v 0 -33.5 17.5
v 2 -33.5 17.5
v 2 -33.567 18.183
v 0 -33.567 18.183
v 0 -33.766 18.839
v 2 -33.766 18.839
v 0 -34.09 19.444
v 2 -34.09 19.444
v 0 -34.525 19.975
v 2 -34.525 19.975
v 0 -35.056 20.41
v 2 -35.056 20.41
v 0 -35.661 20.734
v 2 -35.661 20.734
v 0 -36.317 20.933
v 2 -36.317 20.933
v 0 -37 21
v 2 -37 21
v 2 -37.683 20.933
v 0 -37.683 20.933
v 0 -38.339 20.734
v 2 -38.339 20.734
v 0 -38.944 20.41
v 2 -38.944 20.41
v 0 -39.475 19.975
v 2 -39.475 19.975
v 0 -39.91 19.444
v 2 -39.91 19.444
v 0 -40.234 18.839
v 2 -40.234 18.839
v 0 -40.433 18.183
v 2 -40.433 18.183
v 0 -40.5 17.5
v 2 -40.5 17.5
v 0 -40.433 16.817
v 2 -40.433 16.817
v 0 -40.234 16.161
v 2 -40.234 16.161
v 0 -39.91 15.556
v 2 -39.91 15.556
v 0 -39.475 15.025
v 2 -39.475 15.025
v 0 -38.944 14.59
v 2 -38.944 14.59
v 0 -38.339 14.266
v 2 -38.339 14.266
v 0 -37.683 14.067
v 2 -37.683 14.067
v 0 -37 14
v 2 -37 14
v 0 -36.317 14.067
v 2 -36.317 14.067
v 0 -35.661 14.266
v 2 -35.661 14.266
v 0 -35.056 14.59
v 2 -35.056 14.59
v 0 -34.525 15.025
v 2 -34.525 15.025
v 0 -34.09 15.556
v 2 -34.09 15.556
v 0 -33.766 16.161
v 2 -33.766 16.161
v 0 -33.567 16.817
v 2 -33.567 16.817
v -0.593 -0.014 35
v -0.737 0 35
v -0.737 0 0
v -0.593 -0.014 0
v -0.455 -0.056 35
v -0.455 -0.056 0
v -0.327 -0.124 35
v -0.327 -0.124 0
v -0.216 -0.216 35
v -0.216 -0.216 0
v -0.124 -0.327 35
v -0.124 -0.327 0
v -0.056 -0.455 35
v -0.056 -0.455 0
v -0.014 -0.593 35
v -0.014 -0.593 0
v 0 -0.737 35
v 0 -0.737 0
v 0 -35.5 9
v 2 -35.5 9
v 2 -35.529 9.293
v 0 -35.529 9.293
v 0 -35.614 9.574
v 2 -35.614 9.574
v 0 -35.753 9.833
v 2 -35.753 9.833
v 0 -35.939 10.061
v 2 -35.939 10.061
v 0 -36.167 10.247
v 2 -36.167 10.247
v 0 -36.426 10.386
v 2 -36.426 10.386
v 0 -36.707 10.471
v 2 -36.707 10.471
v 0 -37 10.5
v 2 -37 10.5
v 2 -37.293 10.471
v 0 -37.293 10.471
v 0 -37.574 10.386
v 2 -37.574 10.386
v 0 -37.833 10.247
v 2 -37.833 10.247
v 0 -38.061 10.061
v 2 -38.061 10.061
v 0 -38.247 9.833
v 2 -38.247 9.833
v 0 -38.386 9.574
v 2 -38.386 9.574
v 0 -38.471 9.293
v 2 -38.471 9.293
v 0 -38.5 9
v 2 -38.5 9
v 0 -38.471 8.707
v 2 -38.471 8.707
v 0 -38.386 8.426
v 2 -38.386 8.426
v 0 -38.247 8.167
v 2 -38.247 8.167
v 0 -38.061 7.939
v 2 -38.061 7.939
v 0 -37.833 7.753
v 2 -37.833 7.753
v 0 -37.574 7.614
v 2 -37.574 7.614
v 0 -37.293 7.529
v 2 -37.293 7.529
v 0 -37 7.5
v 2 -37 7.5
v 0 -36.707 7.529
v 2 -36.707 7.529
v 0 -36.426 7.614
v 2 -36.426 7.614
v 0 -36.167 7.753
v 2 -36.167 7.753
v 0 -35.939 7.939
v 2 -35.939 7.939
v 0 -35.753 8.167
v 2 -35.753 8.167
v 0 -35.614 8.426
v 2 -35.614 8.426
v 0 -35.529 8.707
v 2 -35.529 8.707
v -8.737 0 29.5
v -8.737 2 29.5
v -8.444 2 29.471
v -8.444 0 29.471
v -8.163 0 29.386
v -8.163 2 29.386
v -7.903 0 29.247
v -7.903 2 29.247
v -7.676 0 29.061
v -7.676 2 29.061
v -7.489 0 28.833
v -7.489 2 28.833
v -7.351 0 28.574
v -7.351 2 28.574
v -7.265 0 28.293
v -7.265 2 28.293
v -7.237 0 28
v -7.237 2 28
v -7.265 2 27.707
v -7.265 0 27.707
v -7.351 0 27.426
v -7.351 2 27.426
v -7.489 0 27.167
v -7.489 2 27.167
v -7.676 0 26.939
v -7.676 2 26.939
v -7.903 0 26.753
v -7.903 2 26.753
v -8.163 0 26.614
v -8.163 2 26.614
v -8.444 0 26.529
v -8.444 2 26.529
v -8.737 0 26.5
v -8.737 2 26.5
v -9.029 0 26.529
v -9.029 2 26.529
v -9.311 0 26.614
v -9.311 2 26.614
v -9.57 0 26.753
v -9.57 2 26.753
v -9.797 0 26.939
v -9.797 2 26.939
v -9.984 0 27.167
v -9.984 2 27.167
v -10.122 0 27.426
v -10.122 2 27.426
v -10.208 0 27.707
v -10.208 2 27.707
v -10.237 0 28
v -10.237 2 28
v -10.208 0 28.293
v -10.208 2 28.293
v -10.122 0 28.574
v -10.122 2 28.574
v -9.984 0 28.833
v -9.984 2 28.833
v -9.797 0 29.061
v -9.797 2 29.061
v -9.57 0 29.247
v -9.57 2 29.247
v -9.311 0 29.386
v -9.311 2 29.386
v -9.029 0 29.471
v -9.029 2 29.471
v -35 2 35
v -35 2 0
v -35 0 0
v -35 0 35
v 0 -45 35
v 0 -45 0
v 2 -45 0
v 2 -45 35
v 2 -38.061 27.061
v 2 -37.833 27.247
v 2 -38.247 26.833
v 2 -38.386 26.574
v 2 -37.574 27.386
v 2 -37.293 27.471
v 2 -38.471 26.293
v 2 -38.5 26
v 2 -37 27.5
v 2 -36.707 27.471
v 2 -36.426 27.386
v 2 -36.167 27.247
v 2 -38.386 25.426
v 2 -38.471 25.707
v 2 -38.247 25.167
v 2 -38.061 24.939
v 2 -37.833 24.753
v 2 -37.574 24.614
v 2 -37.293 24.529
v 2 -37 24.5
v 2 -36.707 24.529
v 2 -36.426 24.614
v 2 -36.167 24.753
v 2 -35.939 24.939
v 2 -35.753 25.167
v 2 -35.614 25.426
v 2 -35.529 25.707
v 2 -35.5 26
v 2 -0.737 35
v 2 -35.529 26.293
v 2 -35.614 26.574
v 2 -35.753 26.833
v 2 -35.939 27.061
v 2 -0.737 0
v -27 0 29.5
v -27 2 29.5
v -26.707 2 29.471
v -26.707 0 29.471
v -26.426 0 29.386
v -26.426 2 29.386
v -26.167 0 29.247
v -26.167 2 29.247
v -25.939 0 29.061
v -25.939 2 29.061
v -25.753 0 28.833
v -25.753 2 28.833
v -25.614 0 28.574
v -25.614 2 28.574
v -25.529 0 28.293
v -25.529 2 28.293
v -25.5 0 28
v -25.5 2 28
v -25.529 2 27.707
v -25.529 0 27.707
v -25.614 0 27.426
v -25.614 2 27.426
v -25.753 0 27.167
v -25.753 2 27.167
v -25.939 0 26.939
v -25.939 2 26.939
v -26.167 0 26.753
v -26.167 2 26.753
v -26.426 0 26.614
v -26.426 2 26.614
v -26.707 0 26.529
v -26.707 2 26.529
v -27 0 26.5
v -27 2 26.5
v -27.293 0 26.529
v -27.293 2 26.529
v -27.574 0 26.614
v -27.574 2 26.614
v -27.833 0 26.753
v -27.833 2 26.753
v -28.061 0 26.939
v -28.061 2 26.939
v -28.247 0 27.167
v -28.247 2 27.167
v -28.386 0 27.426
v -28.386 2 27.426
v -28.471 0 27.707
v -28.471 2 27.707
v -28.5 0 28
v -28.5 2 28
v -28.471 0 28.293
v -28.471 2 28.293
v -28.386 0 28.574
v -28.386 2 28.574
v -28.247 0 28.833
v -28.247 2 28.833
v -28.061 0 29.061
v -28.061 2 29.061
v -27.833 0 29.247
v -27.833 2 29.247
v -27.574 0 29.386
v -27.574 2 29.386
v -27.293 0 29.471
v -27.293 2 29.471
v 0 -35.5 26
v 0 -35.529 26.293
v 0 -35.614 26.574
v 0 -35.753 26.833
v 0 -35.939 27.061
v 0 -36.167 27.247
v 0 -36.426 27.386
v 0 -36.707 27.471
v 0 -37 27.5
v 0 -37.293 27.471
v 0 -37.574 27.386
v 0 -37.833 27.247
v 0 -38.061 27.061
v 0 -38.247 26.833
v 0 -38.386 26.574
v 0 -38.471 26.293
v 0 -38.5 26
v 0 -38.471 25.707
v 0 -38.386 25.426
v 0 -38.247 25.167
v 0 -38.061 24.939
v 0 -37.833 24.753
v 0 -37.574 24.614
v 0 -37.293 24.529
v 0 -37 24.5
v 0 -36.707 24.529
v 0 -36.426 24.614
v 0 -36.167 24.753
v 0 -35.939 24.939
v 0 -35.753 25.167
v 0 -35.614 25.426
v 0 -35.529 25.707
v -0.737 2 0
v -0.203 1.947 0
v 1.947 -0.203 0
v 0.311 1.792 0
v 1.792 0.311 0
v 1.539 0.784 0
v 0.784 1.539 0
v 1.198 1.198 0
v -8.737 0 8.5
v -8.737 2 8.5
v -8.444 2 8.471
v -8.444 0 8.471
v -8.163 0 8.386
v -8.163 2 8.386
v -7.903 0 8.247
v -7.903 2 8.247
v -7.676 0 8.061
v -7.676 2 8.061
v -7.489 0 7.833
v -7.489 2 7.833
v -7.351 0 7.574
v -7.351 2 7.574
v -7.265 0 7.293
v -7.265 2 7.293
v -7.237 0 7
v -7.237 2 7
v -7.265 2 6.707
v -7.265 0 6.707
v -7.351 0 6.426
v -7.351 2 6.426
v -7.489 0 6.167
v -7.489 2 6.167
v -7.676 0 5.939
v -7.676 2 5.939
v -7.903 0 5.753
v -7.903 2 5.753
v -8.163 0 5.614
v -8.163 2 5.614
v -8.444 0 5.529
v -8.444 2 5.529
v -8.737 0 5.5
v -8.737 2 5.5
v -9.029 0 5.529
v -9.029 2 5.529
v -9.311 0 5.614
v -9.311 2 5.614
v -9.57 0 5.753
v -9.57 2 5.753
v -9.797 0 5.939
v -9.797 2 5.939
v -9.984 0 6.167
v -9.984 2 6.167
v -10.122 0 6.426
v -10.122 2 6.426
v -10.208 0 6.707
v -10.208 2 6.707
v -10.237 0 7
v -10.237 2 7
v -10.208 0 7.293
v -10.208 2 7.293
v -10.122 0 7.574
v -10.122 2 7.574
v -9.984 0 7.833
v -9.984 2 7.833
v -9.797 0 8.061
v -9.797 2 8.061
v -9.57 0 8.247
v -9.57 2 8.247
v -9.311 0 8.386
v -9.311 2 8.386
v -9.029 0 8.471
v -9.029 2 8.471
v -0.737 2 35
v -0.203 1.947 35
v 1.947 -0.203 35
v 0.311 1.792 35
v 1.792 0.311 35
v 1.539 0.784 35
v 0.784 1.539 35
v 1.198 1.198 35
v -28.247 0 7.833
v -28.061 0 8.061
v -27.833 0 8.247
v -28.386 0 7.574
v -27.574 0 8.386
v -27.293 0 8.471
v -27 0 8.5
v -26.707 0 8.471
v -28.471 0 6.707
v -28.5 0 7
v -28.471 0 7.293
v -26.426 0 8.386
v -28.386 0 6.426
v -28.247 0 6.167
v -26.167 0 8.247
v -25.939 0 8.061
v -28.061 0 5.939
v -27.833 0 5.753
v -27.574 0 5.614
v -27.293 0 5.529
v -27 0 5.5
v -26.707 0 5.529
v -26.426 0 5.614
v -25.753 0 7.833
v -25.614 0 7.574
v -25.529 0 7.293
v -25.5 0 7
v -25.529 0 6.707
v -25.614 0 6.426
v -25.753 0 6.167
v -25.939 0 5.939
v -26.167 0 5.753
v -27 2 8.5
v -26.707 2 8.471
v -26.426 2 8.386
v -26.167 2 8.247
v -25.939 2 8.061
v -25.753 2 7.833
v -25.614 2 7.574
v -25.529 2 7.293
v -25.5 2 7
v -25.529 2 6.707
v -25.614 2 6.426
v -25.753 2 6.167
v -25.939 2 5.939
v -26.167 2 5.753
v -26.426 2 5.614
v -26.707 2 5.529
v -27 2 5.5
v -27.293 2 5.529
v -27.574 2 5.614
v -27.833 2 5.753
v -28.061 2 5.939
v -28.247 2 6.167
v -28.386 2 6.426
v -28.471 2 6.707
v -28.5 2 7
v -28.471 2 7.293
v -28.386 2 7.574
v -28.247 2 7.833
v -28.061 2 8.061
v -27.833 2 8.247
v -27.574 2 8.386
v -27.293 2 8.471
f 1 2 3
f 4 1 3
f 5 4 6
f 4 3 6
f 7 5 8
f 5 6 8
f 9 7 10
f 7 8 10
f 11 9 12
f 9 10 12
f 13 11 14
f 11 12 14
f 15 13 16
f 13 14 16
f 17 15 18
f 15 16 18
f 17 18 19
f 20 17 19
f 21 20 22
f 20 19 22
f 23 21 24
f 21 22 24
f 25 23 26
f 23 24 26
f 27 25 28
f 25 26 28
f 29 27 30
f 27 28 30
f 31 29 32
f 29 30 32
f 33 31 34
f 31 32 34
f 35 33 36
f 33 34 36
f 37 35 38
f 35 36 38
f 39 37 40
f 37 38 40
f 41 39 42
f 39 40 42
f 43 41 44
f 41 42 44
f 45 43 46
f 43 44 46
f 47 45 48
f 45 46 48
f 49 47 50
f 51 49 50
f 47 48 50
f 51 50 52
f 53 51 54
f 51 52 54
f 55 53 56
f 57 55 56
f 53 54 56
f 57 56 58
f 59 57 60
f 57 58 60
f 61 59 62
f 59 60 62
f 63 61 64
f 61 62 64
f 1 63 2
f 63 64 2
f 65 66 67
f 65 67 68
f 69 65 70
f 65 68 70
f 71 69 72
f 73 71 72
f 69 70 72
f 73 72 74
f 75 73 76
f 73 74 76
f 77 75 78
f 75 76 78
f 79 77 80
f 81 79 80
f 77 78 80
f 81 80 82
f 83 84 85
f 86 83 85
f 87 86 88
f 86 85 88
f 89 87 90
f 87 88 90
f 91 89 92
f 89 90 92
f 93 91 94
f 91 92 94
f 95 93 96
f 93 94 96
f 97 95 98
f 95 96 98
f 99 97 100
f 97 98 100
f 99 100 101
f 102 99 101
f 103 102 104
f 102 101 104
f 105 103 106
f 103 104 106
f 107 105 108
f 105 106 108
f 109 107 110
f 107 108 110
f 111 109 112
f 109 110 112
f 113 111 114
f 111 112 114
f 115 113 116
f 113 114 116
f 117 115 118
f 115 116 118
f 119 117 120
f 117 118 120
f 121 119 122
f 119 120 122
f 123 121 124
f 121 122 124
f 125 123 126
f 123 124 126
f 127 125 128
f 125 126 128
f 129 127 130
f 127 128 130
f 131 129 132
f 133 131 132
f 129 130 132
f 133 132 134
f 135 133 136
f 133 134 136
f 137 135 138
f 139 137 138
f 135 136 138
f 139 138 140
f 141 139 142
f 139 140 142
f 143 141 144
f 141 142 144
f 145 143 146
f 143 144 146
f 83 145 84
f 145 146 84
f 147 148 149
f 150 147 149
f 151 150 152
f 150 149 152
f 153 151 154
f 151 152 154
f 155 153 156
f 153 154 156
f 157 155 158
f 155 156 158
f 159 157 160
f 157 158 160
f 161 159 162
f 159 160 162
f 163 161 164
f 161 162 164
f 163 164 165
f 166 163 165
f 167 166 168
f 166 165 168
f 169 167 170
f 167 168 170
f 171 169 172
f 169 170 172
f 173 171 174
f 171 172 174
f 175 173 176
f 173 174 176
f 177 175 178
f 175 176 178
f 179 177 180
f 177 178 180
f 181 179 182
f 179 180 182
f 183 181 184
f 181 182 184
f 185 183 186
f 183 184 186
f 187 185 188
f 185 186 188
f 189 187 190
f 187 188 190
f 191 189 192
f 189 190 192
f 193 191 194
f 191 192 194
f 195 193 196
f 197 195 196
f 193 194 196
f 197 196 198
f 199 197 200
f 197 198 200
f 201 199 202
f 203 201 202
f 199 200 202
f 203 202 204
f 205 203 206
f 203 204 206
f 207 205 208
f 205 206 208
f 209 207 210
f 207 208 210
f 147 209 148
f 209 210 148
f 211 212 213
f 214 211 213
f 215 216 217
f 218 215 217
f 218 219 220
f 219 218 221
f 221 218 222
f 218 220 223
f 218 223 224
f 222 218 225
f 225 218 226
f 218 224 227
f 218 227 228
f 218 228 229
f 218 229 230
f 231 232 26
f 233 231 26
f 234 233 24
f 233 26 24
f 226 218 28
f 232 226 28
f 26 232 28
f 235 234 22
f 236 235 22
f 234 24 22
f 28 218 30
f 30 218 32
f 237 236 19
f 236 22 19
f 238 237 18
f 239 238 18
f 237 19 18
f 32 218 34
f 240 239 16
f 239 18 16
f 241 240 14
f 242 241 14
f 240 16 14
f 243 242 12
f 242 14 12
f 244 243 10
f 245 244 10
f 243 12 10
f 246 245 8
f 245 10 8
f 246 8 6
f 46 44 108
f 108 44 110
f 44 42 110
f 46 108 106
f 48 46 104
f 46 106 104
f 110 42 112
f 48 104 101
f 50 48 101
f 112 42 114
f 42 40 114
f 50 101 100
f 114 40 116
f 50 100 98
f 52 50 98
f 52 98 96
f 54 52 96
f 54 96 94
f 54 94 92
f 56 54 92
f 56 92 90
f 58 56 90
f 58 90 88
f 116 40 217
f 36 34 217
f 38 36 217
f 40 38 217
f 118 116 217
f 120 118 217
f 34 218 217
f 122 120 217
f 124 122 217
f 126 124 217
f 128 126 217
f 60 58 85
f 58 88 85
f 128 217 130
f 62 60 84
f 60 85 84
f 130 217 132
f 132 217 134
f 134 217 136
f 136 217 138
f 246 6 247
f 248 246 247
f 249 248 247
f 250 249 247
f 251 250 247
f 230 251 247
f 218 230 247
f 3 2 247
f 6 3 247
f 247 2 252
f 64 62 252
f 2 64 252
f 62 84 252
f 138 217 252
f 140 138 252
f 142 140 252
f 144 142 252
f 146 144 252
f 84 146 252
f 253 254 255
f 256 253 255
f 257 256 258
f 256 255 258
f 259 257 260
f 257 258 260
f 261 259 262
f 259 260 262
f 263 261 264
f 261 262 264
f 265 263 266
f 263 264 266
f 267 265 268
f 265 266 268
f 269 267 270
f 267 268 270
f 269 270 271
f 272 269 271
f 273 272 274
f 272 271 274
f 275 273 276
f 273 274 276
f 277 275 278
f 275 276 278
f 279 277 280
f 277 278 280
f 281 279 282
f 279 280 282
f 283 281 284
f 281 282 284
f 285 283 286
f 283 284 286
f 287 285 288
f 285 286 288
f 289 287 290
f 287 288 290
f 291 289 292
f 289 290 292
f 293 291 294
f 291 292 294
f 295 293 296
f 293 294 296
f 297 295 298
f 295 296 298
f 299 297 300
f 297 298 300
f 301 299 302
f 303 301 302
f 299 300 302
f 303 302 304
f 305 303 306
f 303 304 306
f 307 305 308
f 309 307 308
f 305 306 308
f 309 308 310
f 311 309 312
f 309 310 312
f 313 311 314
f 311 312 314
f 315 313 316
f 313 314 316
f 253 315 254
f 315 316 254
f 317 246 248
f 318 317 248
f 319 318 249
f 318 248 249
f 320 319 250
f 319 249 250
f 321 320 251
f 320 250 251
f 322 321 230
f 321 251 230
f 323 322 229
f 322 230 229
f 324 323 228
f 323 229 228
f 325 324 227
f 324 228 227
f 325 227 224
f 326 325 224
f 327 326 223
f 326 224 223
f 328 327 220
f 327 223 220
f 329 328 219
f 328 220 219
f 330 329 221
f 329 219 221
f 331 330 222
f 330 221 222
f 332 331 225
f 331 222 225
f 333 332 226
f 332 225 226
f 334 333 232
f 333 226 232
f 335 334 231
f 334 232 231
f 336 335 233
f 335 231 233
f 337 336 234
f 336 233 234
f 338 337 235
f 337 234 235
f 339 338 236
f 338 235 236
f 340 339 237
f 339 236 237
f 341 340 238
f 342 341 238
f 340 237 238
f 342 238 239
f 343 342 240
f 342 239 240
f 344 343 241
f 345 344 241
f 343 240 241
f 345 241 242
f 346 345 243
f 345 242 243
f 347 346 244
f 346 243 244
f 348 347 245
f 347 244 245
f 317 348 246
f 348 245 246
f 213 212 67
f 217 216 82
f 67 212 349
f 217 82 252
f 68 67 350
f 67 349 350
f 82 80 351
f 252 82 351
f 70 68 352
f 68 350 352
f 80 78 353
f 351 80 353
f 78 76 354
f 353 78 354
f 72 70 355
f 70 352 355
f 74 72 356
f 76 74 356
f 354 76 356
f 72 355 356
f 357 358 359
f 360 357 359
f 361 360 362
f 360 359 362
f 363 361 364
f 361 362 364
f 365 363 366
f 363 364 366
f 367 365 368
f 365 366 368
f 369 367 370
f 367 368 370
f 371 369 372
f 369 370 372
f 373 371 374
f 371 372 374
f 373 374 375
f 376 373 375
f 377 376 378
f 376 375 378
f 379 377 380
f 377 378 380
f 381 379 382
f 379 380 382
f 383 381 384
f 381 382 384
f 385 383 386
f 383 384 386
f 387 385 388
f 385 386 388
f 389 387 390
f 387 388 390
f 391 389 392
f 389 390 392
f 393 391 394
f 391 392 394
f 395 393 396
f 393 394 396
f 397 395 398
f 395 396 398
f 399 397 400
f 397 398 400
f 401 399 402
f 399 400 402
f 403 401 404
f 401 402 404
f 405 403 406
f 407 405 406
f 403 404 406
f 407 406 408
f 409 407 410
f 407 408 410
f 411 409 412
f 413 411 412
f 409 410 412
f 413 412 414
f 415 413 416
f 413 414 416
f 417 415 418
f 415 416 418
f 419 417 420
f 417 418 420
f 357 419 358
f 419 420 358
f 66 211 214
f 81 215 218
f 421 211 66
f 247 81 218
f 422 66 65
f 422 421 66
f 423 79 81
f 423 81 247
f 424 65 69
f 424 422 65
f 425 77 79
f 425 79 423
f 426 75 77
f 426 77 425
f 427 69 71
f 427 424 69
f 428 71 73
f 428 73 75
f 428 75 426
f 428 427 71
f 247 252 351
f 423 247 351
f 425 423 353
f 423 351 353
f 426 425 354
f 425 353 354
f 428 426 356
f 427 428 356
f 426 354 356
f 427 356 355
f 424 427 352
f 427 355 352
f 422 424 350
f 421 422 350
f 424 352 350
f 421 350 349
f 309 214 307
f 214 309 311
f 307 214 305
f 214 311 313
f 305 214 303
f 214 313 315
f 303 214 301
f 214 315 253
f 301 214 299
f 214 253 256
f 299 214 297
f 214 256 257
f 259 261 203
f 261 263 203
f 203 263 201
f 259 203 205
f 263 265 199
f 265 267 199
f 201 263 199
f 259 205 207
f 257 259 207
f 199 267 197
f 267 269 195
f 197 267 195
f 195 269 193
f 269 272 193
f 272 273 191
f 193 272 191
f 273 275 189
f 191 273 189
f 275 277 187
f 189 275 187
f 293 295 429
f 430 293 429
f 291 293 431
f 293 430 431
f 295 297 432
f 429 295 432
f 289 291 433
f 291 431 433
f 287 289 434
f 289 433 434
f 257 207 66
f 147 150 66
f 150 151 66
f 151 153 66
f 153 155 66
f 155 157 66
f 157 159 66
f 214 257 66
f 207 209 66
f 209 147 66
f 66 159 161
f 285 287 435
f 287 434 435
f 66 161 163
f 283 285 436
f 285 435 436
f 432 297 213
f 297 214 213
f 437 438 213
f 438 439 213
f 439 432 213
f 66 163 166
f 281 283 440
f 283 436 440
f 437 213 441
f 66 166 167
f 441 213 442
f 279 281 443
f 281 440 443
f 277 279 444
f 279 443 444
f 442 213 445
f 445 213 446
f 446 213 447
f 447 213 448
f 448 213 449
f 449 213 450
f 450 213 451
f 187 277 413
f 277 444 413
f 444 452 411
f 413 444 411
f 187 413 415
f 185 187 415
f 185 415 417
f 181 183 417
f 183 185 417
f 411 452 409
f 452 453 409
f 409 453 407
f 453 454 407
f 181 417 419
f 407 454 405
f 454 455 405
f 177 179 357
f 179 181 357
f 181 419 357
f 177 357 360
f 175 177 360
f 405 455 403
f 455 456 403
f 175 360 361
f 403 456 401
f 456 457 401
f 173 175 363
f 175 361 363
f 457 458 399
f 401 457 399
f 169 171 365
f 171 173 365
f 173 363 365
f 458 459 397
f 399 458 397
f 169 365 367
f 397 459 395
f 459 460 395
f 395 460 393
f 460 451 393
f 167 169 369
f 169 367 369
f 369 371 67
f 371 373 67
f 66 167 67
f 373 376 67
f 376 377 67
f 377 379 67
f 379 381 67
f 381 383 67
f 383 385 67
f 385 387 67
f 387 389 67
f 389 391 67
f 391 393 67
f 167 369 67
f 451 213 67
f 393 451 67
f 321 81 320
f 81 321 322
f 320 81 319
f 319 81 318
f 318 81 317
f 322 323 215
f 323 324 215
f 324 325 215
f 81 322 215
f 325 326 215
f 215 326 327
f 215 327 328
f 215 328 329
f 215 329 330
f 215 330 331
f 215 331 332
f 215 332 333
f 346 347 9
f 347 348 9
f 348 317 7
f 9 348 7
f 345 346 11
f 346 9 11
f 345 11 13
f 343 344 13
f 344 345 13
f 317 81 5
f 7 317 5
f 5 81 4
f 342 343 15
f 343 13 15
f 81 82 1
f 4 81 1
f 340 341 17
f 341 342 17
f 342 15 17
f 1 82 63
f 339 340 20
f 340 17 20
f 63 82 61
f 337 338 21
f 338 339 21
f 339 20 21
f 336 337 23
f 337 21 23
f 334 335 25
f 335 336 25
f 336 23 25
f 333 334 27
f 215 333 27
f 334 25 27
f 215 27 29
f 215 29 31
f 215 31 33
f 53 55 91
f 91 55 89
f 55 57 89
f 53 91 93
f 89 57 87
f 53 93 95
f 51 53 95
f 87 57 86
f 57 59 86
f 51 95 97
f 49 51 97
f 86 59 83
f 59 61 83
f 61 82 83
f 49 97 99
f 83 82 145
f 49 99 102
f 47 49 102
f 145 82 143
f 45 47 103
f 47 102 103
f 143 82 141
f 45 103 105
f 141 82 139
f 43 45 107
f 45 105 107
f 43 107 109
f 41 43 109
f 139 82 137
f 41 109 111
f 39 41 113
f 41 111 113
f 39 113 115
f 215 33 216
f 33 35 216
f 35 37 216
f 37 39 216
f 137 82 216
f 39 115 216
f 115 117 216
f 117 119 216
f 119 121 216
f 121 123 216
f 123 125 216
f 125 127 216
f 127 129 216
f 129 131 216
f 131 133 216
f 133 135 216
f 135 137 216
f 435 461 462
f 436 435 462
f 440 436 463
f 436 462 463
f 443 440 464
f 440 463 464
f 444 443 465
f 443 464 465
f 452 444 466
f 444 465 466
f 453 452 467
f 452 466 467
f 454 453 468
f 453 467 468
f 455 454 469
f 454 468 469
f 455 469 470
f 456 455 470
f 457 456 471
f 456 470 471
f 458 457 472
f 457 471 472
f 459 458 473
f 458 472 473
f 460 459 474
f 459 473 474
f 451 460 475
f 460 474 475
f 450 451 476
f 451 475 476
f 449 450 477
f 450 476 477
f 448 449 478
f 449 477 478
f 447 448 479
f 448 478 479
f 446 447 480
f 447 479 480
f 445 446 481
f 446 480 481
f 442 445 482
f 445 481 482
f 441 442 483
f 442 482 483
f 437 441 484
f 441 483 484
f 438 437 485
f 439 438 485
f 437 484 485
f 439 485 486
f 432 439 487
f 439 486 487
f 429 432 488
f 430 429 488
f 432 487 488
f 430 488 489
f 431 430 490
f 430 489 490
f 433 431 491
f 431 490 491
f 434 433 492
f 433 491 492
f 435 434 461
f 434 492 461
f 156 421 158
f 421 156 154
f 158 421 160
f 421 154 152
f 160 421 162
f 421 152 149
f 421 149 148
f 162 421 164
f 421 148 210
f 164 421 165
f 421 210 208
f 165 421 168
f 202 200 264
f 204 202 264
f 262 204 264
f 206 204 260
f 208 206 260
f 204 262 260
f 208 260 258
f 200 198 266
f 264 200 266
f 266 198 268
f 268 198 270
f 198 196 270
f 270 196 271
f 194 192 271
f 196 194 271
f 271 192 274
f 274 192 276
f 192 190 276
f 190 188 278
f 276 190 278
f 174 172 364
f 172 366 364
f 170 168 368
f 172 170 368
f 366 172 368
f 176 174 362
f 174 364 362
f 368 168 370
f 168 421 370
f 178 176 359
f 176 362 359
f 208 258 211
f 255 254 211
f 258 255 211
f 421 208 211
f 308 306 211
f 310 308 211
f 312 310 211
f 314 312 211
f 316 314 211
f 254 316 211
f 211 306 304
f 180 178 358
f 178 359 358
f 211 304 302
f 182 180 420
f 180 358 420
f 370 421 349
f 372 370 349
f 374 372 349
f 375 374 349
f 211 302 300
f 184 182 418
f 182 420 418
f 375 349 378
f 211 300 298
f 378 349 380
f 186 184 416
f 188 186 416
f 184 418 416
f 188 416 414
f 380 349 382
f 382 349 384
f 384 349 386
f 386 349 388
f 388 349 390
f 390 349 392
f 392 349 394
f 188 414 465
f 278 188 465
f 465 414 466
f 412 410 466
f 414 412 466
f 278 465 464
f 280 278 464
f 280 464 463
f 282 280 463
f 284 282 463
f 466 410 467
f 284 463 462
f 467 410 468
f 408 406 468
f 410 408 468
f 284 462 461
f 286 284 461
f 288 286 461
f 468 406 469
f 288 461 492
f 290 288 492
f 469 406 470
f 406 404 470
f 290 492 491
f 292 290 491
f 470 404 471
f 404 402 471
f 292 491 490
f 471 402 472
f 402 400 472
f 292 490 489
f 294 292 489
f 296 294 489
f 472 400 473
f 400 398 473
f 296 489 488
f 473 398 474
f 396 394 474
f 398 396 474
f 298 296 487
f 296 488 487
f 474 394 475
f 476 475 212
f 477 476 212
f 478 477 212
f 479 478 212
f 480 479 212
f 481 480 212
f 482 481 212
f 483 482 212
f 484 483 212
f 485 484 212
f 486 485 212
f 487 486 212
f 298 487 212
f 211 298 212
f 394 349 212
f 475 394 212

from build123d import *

# Parameters (mm, degrees)
T_LE_DE_BASE_PLI_E1_DEPTH = 35
ESQUISSE14_R              = 1.5
ENL_V_MAT_EXTRU_1_DEPTH   = 2
ESQUISSE15_R              = 3.5
ESQUISSE15_R_2            = 1.5
ENL_V_MAT_EXTRU_2_DEPTH   = 2


# Sheet-metal steps are written as plain solids
with BuildPart() as part:
    # Esquisse8 → Tôle de base pliée1 (new body)
    with BuildSketch(Plane.XY):
        with BuildLine():
            Line((-35, 0), (-0.7366, 0))
            ThreePointArc((-0.7366, 0), (-0.215745145, -0.215745145), (0, -0.7366))
            Line((0, -0.7366), (0, -45))
            Line((0, -45), (2, -45))
            Line((2, -45), (2, -0.7366))
            ThreePointArc((2, -0.7366), (1.198468417, 1.198468417), (-0.7366, 2))
            Line((-0.7366, 2), (-35, 2))
            Line((-35, 2), (-35, 0))
        make_face()
    extrude(amount=T_LE_DE_BASE_PLI_E1_DEPTH)

    # Esquisse14 → Enlèv. mat.-Extru.1 (cut)
    with BuildSketch(Plane(origin=(0, 2, 0), x_dir=(1, 0, 0), z_dir=(0, 1, 0))):
        with Locations(Location((-27, -7, 0), (0, 0, 270))):
            Circle(ESQUISSE14_R)
        with Locations(Location((-8.7366, -7, 0), (0, 0, 270))):
            Circle(ESQUISSE14_R)
        with Locations(Location((-8.7366, -28, 0), (0, 0, 270))):
            Circle(ESQUISSE14_R)
        with Locations(Location((-27, -28, 0), (0, 0, 270))):
            Circle(ESQUISSE14_R)
    extrude(amount=-ENL_V_MAT_EXTRU_1_DEPTH, mode=Mode.SUBTRACT)

    # Esquisse15 → Enlèv. mat.-Extru.2 (cut)
    with BuildSketch(Plane(origin=(2, 0, 0), x_dir=(0, 0, -1), z_dir=(1, 0, 0))):
        with Locations(Location((-17.5, -37, 0), (0, 0, 90))):
            Circle(ESQUISSE15_R)
        with Locations(Location((-9, -37, 0), (0, 0, 90))):
            Circle(ESQUISSE15_R_2)
        with Locations(Location((-26, -37, 0), (0, 0, 90))):
            Circle(ESQUISSE15_R_2)
    extrude(amount=-ENL_V_MAT_EXTRU_2_DEPTH, mode=Mode.SUBTRACT)


solid = part.part
